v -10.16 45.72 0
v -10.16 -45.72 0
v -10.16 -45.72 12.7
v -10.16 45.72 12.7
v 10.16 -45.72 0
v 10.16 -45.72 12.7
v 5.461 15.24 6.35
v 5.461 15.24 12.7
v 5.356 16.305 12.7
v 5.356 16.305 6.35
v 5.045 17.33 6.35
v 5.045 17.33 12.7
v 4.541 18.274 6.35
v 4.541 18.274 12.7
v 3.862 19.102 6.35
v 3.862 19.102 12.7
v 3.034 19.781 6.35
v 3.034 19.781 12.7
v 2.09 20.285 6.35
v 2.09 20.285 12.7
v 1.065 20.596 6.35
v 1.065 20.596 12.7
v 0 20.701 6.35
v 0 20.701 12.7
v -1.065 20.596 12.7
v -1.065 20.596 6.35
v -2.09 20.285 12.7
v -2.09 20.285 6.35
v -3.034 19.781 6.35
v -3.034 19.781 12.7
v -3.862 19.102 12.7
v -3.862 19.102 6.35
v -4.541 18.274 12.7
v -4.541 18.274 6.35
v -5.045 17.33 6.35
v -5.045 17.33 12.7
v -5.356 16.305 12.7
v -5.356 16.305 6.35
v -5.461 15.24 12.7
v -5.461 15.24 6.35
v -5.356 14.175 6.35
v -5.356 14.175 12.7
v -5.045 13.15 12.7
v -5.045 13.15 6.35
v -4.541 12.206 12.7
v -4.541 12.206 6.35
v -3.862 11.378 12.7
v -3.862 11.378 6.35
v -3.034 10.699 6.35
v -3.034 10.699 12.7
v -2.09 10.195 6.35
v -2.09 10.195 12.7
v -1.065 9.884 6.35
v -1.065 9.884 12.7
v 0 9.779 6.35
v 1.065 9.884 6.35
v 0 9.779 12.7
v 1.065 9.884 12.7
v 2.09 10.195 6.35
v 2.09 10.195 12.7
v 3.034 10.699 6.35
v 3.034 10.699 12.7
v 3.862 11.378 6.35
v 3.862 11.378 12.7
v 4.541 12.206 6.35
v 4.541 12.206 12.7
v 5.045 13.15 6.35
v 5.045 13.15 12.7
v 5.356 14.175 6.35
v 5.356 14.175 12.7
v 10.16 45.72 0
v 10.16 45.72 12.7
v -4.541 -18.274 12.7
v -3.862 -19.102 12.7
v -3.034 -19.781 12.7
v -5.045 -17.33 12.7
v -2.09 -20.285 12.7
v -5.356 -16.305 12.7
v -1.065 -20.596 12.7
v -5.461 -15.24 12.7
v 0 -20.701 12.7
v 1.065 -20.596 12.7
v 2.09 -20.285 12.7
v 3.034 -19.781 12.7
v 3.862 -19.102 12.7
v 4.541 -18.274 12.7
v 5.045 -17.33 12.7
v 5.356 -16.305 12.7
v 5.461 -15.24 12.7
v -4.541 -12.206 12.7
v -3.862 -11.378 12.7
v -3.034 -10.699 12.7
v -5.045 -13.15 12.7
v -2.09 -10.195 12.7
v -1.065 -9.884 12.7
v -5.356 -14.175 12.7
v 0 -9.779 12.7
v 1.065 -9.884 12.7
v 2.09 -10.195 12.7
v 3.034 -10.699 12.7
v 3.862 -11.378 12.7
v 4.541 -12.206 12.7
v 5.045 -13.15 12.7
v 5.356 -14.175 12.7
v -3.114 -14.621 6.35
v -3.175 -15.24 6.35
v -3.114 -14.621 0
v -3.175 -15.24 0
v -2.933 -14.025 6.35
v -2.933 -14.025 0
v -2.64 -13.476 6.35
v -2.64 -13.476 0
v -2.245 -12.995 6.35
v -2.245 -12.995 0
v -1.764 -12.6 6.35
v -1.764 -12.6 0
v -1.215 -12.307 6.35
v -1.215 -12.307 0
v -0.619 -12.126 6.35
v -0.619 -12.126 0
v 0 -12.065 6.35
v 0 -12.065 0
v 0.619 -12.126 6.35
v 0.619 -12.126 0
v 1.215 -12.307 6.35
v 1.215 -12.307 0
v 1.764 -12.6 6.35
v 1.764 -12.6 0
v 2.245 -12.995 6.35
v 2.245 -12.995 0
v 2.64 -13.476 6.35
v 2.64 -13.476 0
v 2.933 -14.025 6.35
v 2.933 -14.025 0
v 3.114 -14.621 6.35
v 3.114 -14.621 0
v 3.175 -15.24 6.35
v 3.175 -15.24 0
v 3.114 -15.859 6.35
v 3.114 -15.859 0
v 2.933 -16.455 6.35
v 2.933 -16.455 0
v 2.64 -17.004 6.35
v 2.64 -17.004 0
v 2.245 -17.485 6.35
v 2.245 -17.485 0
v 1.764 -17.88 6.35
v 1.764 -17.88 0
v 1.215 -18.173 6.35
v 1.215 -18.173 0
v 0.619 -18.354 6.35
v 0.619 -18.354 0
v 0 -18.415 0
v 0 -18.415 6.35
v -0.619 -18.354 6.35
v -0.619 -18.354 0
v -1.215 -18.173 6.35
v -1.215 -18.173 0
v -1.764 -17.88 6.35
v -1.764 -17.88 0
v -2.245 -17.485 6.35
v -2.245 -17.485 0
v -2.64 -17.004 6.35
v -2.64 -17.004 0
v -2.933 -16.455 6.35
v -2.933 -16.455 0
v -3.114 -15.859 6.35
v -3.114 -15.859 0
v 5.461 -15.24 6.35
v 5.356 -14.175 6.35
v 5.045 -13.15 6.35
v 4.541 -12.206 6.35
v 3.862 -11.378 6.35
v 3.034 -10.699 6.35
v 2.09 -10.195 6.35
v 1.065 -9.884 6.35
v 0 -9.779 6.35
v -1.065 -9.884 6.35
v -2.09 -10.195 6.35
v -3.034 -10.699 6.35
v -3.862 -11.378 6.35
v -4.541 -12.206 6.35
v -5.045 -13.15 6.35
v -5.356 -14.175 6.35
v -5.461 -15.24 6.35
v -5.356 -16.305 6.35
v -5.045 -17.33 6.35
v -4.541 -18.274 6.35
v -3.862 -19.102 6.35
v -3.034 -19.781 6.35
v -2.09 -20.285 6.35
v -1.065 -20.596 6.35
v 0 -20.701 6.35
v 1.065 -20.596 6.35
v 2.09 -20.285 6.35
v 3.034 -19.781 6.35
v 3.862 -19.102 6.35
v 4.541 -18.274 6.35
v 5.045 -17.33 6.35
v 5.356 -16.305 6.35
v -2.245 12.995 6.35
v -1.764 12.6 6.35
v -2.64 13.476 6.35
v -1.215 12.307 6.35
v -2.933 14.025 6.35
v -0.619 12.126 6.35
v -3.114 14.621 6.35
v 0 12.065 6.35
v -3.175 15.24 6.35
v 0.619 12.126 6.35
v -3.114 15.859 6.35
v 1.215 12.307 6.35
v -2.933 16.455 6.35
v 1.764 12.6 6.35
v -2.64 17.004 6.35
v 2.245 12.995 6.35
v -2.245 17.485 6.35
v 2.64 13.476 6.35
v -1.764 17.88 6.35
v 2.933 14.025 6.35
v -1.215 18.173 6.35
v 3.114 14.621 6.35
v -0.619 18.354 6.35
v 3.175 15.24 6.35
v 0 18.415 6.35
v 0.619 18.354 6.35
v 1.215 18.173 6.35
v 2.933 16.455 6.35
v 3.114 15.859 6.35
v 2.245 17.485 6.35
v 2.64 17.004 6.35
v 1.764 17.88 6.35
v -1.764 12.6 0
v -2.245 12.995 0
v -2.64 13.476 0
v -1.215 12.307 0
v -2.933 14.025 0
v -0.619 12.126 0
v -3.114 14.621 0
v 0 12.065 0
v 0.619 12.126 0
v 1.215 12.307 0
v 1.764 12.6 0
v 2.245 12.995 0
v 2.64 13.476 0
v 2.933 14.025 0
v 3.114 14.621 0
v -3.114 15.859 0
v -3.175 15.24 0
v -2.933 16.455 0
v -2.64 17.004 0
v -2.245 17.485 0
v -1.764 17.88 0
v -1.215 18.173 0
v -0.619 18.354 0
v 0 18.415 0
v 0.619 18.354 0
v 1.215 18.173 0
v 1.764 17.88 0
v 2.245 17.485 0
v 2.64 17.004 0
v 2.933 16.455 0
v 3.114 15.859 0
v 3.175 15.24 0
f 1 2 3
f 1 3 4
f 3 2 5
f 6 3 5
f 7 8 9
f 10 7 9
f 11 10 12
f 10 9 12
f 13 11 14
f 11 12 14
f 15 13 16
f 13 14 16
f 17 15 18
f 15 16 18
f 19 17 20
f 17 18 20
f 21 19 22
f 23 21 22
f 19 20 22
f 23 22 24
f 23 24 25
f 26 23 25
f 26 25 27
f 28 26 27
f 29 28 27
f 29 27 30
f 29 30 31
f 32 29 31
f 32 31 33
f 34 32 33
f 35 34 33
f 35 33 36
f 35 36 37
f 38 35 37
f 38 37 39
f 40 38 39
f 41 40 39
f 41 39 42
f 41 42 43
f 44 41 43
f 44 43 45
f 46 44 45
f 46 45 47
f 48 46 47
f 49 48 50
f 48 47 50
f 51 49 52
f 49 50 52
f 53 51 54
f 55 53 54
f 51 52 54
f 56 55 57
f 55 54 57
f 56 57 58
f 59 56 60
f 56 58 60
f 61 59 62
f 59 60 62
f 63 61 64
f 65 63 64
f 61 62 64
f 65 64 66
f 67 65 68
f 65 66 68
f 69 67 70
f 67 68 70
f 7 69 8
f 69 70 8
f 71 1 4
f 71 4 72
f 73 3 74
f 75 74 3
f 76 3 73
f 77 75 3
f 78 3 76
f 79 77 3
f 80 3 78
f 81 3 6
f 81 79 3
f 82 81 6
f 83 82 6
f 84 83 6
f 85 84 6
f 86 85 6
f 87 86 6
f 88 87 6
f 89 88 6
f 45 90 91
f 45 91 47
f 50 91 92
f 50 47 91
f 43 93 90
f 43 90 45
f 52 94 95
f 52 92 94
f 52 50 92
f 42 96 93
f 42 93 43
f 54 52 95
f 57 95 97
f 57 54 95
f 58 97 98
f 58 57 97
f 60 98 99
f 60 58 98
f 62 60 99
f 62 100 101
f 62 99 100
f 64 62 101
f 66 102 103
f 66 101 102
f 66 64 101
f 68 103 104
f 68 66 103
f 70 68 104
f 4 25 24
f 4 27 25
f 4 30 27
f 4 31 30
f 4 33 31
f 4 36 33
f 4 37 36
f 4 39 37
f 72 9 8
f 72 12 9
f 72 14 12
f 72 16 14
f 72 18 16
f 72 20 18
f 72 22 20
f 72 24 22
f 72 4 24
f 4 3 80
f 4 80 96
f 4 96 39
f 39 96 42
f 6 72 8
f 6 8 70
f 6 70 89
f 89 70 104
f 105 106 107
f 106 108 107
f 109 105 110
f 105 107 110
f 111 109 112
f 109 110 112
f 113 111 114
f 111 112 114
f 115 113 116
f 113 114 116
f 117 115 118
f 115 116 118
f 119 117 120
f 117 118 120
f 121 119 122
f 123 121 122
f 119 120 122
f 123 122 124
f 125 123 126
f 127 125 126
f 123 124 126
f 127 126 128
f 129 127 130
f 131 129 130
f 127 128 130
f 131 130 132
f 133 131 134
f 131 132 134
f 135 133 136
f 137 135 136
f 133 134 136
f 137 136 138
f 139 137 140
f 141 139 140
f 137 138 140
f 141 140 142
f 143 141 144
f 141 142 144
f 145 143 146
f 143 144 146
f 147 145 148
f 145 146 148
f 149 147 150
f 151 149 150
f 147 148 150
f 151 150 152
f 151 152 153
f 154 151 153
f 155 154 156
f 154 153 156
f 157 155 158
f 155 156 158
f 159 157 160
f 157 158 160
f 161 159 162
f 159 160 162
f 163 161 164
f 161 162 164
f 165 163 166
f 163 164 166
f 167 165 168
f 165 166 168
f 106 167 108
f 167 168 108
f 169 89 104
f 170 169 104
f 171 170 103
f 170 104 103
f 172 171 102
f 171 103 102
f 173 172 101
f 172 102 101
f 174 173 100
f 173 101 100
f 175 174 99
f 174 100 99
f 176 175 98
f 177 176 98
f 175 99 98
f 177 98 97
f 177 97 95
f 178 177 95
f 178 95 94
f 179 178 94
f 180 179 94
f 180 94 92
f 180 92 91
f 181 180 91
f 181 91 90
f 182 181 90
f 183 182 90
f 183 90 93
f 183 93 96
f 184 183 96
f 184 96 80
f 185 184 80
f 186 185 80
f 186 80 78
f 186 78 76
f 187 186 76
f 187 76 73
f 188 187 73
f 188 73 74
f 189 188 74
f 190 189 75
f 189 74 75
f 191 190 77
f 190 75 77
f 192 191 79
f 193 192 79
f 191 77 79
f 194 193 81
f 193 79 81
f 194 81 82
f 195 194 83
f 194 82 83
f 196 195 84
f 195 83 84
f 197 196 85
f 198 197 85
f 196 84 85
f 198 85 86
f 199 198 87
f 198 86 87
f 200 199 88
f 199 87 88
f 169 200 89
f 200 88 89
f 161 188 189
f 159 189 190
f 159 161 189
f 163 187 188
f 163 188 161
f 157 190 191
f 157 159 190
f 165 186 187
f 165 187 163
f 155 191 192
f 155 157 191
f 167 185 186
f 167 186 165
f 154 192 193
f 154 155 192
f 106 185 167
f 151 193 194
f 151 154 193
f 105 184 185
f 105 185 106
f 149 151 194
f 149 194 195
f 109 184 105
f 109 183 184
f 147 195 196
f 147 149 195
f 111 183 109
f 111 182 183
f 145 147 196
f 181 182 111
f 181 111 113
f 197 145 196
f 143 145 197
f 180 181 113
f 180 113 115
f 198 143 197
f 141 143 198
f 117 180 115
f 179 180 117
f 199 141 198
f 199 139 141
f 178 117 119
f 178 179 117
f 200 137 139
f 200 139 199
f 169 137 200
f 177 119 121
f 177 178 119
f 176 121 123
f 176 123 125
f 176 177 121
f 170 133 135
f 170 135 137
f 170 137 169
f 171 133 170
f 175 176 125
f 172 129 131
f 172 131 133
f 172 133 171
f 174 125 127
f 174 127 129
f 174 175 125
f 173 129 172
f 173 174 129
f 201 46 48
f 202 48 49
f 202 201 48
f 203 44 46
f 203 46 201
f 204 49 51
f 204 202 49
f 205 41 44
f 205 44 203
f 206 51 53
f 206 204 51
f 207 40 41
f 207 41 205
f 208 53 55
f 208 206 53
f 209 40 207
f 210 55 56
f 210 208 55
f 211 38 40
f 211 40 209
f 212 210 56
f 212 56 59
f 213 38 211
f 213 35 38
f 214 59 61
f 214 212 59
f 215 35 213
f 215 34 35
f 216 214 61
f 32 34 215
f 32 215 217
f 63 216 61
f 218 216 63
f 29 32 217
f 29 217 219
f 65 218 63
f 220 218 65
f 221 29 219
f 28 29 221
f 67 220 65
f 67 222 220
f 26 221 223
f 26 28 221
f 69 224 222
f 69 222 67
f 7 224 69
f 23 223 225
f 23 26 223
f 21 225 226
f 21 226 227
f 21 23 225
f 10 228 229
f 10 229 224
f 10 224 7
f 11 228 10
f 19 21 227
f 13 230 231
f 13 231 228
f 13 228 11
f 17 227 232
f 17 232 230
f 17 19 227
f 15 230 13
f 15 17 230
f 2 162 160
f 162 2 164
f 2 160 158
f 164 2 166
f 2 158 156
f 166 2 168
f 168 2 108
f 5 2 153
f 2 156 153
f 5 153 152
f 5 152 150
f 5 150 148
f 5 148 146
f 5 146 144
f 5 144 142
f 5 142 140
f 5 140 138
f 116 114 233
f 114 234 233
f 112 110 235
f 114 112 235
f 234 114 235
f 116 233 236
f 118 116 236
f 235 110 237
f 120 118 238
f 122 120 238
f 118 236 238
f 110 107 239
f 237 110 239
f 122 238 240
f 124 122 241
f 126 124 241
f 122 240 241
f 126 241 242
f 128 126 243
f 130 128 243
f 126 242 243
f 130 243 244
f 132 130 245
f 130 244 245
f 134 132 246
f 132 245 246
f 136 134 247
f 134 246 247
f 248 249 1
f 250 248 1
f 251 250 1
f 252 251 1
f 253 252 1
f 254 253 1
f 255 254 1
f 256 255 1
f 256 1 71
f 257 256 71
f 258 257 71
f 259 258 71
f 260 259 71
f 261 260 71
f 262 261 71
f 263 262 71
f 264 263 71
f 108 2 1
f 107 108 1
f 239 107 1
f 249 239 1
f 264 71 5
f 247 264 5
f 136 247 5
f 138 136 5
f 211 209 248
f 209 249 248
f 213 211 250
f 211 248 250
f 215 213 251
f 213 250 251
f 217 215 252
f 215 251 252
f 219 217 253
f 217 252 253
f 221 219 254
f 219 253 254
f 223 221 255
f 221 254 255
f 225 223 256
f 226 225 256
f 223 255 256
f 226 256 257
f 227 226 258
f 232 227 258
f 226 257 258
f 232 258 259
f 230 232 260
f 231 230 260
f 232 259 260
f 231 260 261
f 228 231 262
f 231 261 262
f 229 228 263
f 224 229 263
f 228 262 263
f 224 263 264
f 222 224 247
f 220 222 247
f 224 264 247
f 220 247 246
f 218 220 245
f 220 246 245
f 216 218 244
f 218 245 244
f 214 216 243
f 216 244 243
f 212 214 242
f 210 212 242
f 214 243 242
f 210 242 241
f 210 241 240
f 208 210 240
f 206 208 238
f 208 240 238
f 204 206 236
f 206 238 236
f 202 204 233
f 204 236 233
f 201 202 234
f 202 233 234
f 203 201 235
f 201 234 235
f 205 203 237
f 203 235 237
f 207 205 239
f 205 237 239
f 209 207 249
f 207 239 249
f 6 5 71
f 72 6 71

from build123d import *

# Parameters (mm, degrees)
F0_W           = 20.32
F0_H           = 91.44
F1_DEPTH       = 12.7
F3_D           = 6.35
F3_CBORE_D     = 10.922
F3_CBORE_DEPTH = 6.35


with BuildPart() as f1:
    # F0 (on Top) → F1 (new body)
    with BuildSketch(Plane.XY):
        Rectangle(F0_W, F0_H)
    extrude(amount=F1_DEPTH)

    # F3 (through all)
    with Locations(Plane.XY.offset(12.7)):
        with Locations((0, 15.24), (0, -15.24)):
            CounterBoreHole(F3_D / 2, F3_CBORE_D / 2, F3_CBORE_DEPTH)


solid = f1.part
